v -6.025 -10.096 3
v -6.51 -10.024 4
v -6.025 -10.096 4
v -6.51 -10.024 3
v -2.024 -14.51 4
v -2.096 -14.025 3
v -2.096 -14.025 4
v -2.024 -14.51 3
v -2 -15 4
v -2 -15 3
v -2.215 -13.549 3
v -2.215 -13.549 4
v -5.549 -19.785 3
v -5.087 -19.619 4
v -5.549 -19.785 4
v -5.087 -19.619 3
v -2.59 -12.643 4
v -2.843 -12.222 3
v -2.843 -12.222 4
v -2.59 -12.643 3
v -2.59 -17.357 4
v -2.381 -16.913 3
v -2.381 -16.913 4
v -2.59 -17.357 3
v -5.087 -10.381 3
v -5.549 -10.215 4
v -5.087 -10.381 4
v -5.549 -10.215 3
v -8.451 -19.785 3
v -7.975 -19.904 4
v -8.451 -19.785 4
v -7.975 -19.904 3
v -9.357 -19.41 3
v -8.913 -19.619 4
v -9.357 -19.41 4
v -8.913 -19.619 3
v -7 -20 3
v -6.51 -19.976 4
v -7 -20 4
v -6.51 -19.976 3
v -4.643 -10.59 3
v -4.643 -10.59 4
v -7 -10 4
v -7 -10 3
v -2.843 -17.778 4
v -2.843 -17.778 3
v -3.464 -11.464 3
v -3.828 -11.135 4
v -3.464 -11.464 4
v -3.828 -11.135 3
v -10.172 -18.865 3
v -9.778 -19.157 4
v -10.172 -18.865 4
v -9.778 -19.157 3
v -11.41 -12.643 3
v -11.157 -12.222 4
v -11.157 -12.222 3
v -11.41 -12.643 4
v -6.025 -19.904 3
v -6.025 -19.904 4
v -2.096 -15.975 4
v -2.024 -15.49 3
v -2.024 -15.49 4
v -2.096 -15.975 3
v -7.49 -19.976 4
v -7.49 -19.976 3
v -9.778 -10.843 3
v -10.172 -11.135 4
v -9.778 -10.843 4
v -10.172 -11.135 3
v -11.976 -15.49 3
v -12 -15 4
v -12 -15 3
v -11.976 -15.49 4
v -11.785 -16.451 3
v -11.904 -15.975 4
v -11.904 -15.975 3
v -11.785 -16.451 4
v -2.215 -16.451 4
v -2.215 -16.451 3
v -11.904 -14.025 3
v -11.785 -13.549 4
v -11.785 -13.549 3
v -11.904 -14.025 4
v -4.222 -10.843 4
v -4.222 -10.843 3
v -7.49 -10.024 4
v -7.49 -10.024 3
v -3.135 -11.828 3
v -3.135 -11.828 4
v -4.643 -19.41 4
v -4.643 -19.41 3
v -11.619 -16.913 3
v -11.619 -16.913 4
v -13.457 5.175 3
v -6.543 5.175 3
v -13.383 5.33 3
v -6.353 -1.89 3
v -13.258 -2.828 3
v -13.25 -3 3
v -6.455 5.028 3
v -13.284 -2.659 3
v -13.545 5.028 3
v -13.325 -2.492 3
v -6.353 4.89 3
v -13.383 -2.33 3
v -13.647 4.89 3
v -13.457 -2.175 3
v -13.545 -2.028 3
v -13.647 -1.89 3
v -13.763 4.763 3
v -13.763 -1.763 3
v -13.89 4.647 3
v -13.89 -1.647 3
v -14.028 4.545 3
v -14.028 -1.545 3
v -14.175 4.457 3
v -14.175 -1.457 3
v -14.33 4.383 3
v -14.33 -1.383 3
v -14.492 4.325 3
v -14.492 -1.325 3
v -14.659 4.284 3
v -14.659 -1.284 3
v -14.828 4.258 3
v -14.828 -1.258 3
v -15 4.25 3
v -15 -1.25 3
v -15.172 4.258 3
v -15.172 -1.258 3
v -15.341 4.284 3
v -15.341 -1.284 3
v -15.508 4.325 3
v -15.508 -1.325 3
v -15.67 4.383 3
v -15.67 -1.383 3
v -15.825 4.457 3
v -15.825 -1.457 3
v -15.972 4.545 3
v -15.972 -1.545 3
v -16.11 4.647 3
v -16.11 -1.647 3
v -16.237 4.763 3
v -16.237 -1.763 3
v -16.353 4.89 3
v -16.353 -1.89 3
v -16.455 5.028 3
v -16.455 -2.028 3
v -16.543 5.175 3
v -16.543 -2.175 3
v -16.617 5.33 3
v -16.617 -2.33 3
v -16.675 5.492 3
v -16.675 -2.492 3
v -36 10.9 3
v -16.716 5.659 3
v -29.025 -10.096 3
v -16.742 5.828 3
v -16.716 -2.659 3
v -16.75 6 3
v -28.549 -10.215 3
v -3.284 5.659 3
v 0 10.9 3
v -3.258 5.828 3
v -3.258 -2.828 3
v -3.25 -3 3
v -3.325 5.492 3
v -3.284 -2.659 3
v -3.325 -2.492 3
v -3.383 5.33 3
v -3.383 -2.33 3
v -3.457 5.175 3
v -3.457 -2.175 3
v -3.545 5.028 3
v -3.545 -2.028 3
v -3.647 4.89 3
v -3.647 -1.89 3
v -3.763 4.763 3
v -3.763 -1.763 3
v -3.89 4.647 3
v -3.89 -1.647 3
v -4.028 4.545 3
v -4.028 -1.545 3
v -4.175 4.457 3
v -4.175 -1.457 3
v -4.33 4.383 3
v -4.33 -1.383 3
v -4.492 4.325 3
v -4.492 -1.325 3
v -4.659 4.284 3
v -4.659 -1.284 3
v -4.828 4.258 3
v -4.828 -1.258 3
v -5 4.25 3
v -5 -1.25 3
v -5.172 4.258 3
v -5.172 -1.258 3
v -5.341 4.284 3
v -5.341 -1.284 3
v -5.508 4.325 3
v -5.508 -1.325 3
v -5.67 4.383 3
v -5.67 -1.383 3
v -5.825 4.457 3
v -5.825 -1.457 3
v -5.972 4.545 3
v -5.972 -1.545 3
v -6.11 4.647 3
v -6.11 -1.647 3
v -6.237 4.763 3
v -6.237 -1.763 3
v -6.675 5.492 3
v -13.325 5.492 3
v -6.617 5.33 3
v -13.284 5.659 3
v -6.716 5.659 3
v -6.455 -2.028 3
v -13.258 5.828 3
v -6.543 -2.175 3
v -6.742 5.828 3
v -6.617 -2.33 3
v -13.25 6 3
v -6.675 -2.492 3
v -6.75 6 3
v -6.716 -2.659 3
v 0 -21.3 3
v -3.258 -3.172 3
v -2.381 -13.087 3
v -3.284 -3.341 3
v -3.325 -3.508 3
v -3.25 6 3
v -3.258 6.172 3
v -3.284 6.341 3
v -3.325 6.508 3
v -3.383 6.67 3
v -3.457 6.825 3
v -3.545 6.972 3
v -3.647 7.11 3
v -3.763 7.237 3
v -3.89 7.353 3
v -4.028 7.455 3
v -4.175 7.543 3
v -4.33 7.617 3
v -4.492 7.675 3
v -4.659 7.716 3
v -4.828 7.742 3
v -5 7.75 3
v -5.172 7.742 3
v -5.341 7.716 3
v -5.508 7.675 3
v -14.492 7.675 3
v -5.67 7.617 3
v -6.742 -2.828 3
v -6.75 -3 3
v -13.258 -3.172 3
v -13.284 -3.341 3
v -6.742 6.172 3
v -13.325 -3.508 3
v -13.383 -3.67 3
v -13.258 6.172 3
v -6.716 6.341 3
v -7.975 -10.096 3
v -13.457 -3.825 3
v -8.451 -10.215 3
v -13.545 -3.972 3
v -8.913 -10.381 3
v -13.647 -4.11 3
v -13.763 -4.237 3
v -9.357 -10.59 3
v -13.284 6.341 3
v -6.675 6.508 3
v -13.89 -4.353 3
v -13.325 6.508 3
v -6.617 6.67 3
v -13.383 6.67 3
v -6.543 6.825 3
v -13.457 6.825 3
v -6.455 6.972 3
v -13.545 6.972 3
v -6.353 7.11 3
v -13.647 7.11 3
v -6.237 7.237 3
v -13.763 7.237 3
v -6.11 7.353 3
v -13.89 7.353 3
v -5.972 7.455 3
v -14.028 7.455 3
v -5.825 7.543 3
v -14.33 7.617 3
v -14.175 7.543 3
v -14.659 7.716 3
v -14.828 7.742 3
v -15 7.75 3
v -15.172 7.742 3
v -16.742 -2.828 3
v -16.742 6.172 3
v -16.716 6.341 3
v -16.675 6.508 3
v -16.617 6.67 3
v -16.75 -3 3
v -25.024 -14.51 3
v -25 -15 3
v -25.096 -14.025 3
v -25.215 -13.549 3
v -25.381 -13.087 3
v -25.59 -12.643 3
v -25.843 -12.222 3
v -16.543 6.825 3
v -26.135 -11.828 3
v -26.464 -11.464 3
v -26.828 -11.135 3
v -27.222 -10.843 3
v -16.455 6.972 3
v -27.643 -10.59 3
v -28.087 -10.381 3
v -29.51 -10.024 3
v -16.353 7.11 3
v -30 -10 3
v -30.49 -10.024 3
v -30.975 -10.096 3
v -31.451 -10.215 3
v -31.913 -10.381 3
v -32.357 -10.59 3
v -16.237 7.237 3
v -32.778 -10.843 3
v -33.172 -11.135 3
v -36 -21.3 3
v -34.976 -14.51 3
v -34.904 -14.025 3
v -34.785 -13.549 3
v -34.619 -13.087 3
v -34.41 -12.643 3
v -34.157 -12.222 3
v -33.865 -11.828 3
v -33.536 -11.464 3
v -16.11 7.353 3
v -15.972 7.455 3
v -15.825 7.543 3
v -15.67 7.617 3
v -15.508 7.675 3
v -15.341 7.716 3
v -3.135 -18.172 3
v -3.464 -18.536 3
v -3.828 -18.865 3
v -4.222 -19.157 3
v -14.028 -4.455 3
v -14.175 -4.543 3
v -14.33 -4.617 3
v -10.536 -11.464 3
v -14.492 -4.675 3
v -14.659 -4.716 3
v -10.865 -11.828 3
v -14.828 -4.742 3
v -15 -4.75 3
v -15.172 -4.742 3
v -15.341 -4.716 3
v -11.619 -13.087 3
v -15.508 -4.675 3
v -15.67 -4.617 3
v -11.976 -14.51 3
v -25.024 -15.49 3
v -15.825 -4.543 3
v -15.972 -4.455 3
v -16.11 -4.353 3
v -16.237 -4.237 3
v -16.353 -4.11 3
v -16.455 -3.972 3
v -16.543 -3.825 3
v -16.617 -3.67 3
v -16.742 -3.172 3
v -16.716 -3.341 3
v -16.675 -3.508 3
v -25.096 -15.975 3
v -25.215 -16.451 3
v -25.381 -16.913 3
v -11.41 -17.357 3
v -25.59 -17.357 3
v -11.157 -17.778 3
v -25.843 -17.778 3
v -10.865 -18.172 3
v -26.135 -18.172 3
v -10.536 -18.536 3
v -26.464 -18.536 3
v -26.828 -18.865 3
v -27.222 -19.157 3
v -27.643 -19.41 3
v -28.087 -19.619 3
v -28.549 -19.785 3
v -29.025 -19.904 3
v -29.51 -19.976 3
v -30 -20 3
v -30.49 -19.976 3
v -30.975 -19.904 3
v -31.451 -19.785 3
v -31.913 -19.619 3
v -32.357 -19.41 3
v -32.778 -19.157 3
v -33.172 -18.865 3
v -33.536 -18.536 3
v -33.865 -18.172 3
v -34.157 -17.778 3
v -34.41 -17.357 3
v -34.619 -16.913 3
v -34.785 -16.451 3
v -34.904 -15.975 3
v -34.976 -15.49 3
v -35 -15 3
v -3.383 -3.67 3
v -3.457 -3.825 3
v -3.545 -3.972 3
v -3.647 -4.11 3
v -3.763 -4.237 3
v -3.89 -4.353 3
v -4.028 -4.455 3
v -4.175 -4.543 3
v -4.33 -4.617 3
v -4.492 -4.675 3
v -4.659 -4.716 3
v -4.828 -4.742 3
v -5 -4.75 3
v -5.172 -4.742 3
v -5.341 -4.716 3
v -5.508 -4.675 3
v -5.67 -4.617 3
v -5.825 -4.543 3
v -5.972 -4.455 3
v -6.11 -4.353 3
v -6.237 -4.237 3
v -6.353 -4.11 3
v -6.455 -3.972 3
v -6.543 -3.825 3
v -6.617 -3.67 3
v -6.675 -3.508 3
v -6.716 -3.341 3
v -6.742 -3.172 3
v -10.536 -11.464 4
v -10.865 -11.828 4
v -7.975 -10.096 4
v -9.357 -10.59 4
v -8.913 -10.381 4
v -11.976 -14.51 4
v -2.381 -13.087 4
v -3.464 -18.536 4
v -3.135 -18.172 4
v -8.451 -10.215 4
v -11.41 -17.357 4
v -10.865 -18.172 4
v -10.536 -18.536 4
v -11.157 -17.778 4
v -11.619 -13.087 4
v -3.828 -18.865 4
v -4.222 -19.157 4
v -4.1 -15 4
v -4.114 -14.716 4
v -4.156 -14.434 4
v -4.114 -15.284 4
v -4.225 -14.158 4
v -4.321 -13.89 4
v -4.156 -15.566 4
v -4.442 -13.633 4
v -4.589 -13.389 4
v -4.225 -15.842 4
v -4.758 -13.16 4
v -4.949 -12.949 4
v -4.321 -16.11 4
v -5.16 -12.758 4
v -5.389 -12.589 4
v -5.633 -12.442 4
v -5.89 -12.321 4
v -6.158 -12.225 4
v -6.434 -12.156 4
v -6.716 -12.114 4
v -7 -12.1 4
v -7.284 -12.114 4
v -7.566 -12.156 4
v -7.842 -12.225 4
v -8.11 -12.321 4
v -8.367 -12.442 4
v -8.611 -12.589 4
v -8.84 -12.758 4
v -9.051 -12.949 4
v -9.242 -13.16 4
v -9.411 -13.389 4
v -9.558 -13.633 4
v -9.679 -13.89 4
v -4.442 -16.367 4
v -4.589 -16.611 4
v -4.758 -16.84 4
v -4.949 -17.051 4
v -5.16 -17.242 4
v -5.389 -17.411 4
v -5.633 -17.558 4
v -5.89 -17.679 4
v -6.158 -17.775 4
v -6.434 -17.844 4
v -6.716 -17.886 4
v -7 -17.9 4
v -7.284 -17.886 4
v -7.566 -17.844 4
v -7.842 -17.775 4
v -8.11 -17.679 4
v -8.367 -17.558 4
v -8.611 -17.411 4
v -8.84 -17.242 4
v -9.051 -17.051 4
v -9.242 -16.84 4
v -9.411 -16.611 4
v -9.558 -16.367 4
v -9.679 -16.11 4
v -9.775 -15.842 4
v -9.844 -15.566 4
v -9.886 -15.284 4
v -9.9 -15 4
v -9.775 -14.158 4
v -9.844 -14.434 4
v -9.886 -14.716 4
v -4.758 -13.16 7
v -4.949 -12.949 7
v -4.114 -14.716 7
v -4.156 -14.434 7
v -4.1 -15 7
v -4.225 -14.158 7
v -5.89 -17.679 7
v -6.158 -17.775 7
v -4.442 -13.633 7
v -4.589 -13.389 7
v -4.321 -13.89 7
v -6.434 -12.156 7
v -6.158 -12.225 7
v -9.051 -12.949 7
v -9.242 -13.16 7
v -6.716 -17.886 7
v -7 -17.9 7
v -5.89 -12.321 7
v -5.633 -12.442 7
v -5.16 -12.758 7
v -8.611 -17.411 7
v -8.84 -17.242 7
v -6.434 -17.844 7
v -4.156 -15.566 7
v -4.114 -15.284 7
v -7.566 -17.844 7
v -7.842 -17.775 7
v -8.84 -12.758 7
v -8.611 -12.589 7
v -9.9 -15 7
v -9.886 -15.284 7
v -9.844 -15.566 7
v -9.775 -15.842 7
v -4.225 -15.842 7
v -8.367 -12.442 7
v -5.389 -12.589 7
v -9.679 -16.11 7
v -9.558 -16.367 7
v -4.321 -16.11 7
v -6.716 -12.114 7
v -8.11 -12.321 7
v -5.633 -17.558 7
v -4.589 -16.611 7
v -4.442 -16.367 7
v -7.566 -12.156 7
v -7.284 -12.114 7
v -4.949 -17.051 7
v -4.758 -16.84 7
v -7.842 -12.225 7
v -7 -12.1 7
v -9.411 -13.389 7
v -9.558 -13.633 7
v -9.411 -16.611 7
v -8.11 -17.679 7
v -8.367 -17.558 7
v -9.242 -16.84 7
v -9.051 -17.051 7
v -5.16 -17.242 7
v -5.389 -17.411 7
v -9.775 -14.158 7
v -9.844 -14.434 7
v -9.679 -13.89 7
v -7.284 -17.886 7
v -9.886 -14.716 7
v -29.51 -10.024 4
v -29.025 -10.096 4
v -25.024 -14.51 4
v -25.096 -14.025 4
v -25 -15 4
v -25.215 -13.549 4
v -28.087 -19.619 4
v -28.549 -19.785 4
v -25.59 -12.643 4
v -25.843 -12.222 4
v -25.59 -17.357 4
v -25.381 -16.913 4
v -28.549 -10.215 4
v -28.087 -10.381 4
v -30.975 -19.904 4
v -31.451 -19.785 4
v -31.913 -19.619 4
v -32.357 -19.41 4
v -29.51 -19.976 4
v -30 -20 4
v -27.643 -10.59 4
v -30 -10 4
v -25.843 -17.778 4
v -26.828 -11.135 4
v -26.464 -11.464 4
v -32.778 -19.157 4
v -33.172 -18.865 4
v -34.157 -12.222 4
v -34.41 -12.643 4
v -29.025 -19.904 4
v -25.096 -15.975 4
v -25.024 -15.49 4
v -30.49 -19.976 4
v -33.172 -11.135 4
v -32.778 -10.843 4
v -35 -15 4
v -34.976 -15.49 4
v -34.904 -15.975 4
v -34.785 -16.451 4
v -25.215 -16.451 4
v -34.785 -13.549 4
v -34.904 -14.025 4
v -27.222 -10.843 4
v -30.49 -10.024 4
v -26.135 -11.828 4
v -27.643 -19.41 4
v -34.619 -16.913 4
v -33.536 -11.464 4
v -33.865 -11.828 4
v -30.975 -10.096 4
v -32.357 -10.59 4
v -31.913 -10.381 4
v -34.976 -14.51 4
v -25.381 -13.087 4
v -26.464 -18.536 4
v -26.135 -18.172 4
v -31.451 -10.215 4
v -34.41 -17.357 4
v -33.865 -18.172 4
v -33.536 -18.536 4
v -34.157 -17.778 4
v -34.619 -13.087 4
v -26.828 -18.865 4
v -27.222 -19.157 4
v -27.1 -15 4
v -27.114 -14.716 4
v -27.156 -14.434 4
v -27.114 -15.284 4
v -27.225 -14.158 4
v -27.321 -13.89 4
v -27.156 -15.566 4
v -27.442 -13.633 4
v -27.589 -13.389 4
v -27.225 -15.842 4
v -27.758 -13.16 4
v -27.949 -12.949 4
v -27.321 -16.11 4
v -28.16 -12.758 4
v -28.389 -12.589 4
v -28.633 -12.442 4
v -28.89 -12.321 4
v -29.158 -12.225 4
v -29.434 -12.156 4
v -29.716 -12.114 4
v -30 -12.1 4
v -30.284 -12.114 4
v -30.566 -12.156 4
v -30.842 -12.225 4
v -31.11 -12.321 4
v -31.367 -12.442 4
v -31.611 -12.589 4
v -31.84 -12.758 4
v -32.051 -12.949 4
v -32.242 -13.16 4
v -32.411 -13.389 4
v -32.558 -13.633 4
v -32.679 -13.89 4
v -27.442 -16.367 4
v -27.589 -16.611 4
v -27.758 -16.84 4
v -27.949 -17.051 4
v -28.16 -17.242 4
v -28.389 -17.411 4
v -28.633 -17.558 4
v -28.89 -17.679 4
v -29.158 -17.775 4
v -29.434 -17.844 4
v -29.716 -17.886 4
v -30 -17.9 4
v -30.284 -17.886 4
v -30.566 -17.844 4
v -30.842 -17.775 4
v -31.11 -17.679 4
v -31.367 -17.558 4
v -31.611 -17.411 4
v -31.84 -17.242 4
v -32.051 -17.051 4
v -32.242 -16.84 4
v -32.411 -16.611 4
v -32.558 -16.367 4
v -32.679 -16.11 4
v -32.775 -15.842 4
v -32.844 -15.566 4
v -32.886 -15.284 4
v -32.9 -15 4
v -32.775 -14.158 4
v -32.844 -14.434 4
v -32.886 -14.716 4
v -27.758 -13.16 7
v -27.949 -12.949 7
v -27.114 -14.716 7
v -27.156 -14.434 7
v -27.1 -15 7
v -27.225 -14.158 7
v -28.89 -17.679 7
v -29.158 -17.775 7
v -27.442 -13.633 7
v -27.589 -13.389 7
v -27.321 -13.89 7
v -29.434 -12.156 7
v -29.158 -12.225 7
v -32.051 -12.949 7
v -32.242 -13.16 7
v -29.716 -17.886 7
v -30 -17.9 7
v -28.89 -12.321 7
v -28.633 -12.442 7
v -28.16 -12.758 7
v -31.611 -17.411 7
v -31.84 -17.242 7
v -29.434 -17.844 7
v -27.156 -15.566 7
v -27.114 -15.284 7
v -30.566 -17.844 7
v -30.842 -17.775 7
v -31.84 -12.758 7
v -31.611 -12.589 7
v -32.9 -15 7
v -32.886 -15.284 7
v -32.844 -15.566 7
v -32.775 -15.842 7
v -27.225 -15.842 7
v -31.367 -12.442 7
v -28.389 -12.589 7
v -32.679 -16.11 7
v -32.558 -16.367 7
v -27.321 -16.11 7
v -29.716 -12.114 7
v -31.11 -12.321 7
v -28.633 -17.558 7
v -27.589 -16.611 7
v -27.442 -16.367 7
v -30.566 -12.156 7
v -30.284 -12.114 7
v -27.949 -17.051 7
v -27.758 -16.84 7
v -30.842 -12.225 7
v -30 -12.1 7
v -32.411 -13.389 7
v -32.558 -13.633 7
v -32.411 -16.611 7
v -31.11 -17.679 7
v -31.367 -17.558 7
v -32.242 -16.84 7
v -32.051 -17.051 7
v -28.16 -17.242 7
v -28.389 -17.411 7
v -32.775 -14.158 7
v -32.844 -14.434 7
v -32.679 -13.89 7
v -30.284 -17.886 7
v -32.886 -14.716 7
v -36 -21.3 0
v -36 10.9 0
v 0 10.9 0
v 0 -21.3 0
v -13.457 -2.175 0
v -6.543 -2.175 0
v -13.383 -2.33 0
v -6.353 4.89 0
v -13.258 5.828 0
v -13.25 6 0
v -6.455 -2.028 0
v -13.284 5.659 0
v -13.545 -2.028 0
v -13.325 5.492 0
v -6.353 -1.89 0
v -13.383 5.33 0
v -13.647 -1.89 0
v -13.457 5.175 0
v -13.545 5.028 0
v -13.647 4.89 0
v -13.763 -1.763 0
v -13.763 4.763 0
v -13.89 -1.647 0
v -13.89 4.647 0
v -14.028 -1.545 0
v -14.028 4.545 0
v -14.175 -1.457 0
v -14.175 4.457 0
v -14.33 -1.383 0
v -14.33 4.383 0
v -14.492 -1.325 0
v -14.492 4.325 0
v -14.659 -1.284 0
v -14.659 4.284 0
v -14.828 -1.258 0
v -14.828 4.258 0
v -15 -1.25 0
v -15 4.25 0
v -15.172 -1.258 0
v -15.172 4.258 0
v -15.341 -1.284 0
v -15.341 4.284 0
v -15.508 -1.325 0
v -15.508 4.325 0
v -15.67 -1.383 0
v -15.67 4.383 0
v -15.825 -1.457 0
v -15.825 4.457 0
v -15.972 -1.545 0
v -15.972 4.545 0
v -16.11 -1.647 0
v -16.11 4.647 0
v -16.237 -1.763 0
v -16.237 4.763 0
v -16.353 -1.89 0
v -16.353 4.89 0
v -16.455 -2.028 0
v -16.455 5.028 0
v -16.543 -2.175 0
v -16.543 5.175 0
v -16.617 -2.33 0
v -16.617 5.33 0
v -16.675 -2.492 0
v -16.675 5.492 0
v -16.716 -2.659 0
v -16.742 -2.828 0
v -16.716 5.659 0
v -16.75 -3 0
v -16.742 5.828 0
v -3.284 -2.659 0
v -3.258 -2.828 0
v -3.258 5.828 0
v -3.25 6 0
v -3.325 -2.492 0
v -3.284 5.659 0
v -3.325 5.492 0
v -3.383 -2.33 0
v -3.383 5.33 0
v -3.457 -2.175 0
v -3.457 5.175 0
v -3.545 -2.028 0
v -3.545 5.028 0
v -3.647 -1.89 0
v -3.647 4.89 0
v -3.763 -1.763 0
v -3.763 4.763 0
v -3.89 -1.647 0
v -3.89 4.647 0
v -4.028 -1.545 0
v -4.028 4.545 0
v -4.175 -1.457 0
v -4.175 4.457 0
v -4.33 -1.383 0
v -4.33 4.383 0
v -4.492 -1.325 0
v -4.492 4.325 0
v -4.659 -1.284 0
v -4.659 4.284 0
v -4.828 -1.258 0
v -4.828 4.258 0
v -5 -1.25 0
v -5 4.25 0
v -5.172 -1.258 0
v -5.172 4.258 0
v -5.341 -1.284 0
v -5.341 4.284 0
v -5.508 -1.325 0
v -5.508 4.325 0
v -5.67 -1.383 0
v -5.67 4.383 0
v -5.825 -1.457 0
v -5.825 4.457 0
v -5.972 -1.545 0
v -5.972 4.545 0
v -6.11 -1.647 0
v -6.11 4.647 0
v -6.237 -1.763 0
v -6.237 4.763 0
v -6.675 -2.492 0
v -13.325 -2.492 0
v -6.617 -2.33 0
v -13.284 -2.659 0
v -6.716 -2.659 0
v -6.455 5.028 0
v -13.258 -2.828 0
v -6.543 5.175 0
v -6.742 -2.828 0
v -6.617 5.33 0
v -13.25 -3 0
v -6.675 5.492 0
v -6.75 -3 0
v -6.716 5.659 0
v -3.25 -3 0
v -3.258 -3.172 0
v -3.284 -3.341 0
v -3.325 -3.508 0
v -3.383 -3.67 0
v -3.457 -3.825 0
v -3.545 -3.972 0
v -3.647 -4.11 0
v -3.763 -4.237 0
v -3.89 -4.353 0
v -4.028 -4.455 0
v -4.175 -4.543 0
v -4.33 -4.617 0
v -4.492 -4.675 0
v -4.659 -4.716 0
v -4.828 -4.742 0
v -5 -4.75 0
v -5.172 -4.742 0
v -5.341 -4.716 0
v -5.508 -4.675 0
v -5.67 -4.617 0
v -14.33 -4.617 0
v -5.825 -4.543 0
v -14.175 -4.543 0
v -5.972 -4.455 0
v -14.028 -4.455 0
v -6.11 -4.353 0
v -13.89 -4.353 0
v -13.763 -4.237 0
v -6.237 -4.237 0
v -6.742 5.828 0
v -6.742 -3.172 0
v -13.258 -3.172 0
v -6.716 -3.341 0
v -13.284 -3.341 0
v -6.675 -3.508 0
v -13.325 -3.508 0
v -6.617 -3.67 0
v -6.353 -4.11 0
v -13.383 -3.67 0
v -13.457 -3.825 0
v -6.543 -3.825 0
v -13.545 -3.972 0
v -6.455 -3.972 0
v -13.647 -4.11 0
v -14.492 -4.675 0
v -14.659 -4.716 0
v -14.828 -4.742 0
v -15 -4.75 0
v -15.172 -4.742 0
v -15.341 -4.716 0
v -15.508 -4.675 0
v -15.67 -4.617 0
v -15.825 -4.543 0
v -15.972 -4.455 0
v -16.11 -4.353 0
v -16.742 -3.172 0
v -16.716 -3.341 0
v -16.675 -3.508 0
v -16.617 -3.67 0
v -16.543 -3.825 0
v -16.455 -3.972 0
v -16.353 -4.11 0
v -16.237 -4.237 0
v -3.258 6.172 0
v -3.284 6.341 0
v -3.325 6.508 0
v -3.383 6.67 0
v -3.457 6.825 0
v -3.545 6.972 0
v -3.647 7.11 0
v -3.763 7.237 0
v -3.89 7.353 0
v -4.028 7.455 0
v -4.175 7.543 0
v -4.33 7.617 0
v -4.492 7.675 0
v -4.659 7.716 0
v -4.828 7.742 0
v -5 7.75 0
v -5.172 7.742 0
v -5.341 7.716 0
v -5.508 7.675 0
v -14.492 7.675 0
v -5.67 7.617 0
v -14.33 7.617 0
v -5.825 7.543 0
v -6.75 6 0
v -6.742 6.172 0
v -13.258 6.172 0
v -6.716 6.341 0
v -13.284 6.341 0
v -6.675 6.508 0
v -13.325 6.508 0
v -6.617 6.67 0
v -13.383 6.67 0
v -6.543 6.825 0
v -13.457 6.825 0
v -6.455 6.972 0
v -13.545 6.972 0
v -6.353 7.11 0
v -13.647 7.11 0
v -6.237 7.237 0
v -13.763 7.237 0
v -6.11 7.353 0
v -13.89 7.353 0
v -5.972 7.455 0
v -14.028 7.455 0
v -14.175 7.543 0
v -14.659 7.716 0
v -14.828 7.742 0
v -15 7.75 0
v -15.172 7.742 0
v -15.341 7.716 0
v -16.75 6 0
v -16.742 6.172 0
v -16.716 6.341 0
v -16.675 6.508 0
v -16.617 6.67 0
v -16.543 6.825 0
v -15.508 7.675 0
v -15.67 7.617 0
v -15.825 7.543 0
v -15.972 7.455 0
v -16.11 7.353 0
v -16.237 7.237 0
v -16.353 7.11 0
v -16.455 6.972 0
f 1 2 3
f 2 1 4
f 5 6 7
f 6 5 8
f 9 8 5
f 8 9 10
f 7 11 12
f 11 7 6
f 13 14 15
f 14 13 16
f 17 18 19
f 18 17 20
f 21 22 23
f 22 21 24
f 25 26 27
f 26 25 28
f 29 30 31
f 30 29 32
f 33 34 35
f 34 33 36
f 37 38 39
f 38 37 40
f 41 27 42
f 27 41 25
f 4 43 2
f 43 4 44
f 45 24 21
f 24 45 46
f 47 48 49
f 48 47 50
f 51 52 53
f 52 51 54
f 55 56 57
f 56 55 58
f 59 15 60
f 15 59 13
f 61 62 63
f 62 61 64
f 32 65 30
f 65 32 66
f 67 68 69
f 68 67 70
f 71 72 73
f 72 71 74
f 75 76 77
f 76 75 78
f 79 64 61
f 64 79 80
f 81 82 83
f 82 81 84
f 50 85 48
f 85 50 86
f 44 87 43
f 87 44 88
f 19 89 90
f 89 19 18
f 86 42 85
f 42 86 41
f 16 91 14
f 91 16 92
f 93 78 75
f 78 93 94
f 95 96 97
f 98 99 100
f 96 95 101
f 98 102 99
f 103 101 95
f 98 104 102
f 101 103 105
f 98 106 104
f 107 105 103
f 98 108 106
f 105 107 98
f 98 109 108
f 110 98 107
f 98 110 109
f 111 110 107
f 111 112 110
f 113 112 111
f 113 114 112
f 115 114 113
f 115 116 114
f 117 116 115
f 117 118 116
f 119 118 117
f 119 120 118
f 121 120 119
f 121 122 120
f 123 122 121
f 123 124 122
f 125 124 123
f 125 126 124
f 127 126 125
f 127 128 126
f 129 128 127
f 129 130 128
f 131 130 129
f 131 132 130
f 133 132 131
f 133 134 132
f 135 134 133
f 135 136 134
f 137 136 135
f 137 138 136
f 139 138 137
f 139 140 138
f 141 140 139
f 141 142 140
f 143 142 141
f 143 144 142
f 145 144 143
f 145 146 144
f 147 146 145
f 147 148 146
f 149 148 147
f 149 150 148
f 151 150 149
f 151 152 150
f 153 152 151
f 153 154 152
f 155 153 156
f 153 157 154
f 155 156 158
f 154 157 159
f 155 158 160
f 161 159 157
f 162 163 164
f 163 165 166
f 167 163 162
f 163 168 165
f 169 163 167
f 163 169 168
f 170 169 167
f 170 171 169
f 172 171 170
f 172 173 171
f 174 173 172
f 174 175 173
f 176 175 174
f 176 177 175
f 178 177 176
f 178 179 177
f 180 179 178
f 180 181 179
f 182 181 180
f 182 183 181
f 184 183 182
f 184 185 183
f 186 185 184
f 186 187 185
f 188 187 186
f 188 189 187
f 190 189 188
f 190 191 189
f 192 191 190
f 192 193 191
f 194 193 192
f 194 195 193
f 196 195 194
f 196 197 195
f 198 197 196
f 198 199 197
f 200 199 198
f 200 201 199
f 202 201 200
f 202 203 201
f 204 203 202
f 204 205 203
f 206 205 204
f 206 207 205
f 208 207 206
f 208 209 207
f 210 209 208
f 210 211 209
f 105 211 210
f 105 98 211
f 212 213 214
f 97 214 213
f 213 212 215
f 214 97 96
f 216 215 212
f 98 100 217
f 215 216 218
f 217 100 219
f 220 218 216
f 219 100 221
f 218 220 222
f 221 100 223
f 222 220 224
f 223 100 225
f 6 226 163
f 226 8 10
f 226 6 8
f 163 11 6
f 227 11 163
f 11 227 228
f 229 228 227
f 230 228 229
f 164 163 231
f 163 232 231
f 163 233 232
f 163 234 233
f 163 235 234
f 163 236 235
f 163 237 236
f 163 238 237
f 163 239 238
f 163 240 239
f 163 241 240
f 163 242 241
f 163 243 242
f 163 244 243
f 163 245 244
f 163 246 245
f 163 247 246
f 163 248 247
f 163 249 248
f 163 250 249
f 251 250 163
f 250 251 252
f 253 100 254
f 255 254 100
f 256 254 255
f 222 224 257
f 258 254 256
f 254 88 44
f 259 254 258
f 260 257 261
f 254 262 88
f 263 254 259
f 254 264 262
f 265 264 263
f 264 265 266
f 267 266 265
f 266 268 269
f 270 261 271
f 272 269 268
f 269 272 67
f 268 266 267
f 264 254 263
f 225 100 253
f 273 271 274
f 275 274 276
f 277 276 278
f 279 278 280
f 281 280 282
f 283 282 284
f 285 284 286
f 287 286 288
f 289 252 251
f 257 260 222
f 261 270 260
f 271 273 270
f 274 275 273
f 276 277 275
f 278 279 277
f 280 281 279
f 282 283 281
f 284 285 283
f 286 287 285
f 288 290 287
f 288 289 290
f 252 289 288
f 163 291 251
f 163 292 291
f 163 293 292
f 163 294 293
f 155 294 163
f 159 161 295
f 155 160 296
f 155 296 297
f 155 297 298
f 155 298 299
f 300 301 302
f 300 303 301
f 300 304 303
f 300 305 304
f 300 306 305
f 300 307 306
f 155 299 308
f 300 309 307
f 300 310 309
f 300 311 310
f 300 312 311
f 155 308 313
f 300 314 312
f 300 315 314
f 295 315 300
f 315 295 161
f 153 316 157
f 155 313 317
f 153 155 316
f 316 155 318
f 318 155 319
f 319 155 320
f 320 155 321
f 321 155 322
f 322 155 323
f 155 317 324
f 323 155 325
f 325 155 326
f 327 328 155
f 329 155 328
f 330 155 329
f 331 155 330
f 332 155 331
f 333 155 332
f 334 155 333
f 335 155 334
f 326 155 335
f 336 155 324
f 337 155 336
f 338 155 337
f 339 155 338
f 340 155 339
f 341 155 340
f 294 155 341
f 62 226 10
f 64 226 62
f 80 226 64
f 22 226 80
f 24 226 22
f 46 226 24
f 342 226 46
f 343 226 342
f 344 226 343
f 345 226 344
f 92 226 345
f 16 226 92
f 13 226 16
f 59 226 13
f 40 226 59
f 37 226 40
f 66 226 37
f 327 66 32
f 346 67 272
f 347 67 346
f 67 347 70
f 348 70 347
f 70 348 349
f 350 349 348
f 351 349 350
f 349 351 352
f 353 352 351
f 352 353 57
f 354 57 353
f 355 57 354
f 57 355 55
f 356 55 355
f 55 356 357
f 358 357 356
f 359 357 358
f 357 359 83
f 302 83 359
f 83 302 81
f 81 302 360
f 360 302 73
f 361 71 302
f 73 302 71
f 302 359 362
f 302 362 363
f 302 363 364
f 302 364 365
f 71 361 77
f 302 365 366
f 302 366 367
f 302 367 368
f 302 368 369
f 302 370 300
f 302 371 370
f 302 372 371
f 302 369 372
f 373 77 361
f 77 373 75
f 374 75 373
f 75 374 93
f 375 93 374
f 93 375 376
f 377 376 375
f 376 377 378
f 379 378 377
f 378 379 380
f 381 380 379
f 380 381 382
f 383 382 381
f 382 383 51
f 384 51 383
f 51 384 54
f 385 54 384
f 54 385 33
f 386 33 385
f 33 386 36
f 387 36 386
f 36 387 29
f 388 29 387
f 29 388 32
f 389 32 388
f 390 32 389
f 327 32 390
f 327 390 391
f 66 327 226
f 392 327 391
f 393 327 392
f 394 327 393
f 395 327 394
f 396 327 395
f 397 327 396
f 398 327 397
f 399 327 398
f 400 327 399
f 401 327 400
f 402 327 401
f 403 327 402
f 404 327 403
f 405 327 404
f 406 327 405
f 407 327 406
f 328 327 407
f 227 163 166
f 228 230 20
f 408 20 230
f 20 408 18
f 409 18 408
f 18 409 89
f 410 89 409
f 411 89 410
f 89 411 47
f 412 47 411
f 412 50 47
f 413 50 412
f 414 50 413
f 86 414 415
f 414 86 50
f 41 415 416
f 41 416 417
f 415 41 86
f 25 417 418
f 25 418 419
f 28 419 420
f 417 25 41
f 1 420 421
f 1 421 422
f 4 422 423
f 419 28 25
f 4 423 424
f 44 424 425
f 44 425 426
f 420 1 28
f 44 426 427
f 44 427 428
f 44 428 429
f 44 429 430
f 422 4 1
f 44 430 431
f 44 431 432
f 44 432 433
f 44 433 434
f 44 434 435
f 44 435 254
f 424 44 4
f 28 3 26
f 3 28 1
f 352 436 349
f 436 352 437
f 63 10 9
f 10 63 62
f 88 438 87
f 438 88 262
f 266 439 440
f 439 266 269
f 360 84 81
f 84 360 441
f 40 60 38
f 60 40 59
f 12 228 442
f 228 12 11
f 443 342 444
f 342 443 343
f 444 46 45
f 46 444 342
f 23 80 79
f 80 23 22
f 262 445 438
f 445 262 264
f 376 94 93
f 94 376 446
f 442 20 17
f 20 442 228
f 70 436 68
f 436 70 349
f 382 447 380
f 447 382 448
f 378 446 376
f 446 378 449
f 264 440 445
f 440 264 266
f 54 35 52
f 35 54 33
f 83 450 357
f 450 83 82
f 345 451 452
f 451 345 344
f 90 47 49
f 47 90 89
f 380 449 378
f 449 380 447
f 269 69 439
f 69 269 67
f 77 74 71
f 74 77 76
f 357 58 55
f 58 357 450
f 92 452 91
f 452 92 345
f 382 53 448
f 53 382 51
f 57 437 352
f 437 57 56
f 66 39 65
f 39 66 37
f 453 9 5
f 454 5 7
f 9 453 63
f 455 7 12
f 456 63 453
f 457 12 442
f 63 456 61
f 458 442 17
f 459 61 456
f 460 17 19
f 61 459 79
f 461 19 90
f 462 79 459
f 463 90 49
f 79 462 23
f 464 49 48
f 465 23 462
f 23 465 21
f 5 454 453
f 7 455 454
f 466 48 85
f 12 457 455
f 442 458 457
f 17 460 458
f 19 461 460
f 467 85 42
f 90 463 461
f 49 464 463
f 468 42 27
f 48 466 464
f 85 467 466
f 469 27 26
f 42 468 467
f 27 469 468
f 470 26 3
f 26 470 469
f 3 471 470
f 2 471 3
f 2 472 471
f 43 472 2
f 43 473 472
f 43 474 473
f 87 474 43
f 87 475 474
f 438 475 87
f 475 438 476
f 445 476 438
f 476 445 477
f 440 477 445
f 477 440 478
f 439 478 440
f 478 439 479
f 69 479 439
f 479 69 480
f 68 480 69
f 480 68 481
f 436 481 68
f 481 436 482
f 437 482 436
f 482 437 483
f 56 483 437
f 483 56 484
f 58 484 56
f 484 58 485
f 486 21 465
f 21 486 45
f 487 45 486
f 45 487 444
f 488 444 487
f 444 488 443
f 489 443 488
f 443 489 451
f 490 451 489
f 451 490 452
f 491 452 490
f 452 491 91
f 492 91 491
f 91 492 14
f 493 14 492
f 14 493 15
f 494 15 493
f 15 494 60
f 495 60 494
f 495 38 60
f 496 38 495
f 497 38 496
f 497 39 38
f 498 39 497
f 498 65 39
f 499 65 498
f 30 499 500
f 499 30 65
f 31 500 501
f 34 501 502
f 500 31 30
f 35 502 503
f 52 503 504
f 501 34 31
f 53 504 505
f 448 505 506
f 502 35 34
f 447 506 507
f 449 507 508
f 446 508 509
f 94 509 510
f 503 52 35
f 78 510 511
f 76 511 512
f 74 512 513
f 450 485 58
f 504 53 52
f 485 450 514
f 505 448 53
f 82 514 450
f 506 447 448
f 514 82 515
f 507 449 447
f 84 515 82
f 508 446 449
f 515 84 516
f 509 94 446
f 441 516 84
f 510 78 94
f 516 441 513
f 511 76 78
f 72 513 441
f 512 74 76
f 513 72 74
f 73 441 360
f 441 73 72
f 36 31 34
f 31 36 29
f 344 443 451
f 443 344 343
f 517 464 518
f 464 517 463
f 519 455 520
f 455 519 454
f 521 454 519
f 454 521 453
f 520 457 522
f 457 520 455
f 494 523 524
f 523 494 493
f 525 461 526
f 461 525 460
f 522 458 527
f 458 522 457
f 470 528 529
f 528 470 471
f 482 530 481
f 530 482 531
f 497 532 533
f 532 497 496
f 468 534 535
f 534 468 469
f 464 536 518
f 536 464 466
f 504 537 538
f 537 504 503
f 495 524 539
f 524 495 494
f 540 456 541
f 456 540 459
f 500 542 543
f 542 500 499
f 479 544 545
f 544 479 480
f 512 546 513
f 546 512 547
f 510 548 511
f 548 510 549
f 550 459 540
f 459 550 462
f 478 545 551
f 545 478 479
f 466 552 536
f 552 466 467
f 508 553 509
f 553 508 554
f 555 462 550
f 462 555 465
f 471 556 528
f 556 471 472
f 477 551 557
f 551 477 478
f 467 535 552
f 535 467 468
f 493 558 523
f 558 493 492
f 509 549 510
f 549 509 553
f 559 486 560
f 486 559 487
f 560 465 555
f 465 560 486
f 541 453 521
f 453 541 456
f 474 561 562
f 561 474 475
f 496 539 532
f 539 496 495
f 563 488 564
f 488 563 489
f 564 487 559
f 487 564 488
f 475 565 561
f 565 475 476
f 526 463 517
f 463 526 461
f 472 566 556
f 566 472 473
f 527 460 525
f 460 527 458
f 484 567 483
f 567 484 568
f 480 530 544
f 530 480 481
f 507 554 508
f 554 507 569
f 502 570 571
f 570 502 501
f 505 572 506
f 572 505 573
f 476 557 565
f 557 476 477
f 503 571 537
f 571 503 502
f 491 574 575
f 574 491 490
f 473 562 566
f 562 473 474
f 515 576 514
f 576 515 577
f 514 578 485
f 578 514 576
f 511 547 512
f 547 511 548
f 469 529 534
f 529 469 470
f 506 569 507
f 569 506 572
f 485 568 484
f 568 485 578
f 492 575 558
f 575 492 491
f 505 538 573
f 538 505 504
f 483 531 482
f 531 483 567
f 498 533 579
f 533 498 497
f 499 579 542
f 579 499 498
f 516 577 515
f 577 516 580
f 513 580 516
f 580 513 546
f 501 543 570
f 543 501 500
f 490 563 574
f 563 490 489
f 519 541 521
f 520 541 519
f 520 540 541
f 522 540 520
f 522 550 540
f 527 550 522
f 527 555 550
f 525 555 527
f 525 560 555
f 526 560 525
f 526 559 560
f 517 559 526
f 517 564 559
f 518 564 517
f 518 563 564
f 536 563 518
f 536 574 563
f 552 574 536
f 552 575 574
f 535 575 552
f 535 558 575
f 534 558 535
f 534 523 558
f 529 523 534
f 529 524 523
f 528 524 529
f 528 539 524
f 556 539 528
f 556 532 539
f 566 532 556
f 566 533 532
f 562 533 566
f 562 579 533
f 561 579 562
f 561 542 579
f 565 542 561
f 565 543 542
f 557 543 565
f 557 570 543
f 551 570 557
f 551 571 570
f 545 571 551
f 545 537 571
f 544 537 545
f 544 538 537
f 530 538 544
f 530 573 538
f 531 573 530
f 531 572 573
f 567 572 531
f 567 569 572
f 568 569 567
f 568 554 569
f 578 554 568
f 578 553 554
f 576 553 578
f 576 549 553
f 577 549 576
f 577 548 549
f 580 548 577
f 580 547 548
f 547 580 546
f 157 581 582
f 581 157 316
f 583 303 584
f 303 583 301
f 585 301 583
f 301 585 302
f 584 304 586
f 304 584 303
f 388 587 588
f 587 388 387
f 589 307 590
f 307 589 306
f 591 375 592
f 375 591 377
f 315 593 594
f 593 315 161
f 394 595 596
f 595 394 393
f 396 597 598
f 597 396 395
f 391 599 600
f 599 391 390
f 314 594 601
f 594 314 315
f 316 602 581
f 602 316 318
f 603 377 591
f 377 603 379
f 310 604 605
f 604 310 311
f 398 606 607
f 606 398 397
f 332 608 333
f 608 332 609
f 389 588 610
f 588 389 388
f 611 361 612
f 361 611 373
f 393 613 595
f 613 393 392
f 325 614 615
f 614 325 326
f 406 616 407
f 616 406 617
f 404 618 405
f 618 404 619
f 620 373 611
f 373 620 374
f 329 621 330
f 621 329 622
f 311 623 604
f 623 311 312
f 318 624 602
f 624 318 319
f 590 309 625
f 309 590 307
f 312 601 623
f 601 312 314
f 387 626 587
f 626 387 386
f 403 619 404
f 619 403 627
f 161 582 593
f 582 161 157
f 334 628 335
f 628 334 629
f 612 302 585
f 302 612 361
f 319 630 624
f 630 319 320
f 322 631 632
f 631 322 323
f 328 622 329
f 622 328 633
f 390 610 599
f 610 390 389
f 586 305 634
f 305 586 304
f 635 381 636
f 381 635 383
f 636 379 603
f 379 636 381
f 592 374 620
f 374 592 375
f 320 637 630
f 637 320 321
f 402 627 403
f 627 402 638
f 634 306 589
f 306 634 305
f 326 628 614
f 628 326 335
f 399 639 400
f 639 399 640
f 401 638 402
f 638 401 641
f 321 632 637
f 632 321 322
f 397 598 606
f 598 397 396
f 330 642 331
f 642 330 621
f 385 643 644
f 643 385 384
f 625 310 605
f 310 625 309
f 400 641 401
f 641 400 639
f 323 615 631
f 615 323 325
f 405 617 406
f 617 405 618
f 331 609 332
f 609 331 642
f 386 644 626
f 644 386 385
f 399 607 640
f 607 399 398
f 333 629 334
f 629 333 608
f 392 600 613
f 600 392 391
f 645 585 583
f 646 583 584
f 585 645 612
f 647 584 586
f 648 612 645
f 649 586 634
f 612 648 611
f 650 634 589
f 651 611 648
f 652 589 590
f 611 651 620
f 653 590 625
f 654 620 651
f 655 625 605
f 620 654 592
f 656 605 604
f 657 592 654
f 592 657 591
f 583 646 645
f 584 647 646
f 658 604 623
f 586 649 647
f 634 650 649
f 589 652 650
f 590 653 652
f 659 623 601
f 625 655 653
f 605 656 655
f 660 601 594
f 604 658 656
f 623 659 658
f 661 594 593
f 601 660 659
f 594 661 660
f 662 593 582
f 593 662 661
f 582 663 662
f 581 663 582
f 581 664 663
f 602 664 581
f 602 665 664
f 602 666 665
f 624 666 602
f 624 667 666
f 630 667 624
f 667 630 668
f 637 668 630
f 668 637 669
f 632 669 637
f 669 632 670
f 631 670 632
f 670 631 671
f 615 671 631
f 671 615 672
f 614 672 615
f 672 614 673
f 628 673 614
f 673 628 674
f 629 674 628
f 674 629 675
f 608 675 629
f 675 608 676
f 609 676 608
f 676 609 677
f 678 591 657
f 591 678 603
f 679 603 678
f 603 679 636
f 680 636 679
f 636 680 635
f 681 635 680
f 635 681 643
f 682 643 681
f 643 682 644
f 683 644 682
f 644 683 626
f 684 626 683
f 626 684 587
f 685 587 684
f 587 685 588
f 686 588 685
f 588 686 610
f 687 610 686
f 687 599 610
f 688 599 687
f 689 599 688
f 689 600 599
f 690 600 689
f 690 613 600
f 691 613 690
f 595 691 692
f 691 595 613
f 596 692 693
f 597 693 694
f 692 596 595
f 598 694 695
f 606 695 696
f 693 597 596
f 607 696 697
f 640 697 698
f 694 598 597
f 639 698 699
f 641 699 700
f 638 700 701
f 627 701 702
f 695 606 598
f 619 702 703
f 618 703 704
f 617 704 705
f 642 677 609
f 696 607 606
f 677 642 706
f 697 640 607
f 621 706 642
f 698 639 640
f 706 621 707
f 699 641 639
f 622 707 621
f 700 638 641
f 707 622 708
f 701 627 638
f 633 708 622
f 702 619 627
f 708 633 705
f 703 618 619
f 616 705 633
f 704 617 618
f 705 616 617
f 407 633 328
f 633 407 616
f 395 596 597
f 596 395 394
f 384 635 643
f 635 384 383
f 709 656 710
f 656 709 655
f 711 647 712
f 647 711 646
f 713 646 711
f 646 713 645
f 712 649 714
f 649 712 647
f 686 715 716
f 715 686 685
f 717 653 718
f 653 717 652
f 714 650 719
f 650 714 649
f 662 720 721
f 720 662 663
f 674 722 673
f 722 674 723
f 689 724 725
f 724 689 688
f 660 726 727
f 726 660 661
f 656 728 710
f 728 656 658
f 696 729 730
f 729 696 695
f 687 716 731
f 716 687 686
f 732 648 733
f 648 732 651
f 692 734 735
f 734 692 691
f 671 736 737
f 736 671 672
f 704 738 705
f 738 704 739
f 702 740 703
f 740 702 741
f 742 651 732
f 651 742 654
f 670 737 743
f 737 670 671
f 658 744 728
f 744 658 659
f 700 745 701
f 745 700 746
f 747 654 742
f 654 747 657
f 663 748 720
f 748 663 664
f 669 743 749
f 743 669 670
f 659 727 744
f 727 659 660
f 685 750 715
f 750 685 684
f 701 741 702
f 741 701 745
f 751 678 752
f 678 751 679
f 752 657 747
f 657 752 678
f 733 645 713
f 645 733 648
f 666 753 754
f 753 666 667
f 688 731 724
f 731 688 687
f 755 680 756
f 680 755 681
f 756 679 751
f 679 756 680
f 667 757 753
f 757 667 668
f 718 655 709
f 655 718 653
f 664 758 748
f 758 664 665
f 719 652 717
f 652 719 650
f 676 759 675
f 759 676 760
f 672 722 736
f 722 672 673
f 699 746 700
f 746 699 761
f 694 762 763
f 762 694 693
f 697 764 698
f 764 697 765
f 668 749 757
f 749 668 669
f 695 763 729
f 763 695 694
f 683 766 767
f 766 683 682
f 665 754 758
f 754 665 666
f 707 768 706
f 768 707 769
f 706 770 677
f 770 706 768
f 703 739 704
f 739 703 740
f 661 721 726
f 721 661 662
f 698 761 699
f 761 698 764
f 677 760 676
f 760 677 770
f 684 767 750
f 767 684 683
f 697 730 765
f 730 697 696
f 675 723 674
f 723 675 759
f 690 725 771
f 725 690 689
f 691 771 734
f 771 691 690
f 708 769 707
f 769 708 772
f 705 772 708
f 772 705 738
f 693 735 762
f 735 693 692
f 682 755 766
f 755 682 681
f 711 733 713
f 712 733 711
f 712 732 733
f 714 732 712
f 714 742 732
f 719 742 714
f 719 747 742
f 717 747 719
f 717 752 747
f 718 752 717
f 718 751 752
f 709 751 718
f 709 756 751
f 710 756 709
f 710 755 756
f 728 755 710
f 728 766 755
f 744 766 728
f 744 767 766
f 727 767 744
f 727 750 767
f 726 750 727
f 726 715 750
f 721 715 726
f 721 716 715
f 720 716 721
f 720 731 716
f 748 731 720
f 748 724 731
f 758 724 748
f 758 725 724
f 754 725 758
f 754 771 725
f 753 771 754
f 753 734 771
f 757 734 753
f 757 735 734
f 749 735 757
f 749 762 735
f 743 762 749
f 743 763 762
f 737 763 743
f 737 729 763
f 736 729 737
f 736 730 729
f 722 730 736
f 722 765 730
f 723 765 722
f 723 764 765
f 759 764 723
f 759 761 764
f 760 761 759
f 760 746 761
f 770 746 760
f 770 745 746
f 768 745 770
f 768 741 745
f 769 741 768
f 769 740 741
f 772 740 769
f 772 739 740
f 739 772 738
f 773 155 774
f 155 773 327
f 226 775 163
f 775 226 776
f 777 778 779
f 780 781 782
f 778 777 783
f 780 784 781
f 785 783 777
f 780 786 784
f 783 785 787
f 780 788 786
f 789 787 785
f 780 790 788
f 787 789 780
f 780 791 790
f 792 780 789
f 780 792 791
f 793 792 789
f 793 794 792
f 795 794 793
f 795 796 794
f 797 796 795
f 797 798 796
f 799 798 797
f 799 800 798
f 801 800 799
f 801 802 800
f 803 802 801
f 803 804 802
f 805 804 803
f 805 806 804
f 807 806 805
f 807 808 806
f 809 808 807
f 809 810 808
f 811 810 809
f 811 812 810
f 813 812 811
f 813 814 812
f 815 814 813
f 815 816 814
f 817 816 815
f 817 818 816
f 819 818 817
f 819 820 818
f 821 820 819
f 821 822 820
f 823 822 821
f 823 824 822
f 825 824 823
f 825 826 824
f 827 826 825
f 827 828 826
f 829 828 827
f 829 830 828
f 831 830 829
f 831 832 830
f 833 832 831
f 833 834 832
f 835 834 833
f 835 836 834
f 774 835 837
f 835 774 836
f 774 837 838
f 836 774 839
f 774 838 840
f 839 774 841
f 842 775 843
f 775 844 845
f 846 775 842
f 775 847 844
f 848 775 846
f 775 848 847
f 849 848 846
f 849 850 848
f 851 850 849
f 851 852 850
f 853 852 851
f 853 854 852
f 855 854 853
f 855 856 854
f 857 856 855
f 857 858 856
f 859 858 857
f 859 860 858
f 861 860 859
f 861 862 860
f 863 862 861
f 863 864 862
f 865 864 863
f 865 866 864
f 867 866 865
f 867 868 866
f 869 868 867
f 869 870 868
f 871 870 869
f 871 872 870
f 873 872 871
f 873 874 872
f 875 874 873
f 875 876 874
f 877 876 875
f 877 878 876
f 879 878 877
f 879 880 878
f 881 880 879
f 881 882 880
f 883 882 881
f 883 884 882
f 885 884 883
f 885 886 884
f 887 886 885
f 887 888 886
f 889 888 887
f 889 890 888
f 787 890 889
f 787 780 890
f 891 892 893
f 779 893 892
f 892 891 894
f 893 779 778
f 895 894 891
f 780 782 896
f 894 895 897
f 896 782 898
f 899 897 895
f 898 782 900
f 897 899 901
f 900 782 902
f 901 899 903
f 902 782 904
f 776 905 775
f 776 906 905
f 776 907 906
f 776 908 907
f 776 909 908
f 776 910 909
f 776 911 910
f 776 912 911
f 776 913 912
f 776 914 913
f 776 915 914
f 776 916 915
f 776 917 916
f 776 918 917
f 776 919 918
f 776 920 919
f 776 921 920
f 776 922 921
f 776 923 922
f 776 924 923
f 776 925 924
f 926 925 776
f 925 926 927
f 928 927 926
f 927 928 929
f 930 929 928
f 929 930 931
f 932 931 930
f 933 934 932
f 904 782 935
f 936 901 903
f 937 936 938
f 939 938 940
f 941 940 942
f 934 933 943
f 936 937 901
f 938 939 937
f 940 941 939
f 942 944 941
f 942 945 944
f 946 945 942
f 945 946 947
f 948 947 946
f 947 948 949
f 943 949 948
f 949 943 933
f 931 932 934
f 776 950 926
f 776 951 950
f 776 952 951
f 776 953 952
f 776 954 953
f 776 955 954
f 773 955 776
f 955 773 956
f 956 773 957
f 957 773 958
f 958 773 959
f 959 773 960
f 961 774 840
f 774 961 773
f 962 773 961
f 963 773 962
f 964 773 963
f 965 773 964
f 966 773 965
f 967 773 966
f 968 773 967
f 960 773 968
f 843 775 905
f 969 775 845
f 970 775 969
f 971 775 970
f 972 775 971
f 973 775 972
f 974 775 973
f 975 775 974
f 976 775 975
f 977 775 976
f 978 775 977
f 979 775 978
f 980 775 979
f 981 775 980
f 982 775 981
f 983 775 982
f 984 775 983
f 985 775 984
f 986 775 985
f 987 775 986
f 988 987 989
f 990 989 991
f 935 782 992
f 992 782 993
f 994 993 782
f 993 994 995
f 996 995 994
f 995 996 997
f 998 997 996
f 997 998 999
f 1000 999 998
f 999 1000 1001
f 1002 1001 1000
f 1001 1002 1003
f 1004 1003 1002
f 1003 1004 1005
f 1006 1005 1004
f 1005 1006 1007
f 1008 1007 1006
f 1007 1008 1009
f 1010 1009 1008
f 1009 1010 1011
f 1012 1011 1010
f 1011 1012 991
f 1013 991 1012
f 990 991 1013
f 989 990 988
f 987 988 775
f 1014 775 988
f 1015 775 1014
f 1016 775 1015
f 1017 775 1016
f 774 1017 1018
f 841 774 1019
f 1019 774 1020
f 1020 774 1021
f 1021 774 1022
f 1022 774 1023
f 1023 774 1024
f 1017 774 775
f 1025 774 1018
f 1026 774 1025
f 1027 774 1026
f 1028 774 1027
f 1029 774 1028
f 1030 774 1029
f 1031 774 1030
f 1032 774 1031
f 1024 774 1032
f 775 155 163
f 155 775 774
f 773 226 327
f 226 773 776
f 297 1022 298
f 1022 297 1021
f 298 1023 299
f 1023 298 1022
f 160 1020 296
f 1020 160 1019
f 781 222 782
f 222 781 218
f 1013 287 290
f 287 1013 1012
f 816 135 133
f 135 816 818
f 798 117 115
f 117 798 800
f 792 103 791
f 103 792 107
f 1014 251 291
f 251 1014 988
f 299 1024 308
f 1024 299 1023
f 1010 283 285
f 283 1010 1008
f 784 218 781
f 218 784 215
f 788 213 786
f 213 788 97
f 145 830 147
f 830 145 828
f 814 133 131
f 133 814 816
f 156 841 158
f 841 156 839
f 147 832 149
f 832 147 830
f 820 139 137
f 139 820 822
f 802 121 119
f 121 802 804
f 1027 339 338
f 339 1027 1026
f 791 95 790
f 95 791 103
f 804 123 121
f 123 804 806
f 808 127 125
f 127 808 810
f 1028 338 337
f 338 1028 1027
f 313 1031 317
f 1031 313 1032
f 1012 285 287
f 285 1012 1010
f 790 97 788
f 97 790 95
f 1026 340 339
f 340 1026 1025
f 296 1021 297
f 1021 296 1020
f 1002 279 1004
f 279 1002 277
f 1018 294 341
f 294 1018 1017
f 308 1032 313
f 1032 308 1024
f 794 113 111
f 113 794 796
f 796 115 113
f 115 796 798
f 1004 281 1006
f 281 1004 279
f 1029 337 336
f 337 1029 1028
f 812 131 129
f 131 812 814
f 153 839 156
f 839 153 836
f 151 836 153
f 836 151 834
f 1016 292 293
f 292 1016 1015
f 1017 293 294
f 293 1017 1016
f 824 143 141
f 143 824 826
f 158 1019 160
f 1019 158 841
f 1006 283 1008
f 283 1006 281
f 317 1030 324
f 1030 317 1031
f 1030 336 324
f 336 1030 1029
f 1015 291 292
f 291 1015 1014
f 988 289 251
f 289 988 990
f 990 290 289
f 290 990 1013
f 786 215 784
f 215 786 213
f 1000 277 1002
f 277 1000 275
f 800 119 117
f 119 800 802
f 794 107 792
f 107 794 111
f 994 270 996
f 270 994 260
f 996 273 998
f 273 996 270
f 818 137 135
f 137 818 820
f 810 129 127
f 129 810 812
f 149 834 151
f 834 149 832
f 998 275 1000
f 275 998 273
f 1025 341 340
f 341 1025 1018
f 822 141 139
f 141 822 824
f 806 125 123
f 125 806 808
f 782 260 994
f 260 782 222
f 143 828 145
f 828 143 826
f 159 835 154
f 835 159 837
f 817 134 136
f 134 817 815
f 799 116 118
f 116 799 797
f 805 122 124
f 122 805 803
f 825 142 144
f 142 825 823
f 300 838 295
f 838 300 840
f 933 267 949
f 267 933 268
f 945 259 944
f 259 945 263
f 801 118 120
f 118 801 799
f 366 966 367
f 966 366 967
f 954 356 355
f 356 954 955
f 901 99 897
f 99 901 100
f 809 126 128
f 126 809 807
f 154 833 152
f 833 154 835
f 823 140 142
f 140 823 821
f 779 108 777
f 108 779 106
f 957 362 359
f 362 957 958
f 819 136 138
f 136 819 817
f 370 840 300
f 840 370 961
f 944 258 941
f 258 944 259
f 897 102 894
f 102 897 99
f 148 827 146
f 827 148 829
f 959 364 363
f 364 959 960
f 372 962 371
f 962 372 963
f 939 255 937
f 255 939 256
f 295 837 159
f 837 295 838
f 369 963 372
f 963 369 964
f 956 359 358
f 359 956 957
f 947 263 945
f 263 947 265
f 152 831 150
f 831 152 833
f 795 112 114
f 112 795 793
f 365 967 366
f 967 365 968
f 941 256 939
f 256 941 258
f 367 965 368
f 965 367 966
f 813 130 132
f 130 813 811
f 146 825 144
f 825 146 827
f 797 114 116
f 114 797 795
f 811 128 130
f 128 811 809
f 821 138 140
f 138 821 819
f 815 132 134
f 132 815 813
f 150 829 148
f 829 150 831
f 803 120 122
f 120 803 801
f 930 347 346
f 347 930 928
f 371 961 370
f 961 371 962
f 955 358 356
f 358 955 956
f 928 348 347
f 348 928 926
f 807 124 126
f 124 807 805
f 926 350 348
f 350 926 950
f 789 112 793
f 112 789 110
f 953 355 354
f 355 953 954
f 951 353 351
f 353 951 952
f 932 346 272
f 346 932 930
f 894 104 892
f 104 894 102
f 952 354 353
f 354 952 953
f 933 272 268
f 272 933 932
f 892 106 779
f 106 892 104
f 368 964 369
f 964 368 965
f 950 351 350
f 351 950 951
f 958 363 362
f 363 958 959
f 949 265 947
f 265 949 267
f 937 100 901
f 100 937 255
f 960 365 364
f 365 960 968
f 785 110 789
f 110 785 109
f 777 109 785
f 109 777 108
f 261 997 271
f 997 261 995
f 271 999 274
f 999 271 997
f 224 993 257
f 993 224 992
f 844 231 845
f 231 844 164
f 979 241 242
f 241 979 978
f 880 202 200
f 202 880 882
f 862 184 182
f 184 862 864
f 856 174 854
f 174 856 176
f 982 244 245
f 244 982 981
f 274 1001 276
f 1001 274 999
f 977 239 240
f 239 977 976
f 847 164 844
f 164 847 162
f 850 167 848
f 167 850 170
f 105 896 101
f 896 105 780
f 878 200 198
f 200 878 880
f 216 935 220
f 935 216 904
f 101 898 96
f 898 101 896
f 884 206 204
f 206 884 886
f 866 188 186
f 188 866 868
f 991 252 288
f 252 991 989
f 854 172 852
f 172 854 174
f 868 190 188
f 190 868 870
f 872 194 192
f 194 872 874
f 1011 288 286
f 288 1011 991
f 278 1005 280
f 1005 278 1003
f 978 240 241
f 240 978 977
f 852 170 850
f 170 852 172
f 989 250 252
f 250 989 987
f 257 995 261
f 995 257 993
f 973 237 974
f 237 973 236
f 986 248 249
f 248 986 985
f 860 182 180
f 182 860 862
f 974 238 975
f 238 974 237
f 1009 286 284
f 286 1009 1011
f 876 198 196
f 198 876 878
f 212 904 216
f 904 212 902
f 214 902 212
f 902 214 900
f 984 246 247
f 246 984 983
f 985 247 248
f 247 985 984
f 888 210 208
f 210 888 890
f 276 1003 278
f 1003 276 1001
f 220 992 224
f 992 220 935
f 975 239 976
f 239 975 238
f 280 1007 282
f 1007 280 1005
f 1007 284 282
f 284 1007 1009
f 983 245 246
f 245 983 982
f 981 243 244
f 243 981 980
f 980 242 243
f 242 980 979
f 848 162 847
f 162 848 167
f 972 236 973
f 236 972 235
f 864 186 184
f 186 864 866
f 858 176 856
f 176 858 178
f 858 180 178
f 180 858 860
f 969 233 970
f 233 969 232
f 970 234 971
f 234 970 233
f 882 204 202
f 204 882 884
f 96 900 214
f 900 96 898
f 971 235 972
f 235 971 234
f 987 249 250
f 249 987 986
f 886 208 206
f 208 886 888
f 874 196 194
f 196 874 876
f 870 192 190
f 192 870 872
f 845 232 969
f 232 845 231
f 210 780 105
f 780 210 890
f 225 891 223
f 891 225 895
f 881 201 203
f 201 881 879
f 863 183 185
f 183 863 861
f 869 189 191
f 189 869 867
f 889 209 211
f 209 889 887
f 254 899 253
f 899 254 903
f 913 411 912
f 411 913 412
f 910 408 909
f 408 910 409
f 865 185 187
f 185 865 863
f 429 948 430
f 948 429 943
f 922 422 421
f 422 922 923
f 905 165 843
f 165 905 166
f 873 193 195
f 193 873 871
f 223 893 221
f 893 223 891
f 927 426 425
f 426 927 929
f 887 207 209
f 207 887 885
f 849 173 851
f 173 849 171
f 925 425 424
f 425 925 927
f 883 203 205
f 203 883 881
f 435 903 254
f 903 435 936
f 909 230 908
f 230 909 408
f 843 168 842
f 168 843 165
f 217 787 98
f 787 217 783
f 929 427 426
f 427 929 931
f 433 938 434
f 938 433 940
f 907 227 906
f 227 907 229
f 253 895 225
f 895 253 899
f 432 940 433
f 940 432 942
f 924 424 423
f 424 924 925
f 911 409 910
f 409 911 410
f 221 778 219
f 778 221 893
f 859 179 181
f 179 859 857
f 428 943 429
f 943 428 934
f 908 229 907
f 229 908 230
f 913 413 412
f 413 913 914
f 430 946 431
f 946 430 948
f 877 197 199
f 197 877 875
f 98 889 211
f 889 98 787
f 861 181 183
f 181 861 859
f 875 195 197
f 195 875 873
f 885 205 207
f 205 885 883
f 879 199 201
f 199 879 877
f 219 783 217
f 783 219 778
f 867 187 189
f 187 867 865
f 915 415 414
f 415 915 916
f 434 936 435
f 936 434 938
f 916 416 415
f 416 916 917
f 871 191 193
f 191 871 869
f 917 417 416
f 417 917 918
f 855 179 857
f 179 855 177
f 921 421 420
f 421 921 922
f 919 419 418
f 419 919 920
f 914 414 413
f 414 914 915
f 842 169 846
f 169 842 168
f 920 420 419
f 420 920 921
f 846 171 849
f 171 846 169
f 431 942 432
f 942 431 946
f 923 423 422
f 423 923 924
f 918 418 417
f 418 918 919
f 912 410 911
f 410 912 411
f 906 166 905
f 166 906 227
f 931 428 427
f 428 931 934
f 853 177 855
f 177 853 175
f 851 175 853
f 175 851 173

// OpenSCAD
// file: subpieces/articulation-axis.scad
articulationAxisSubPiece();

/**
 * articulationAxisSubPiece
 * @name articulationAxisSubPiece
 * @description articlulation axis
 * @type subPiece
 */

module articulationAxisSubPiece(
    base_diameter,
    base_height,
    axis_diameter,
    axis_height,
    _fn = 64
) {
    cylinder(
        r = base_diameter / 2,
        h = base_height,
        $fn = _fn
    );
    translate(
        [
            0,
            0,
            base_height
        ]
    )
        cylinder(
            r = axis_diameter / 2,
            h = axis_height,
            $fn = _fn
        );

}
// file: ../envelopes/screw-envelope.scad
screwEnvelope();

module screwEnvelope(
    center_screwed_position = false,
    diameter_ajustment_head = 0.2,
    diameter_ajustment_screw = -0.1,
    _fn = 128
) {

    head_height = 2.1;
    middle_height = 0.9;
    bottom_height = 6;

    z_centring_translation = center_screwed_position ? -head_height -middle_height : 0;

    translate([0,0, z_centring_translation])
        union() {
            cylinder(
                r = 7.95 / 2 + diameter_ajustment_head,
                h = head_height + middle_height,
                $fn = _fn);
            translate([0, 0, head_height + middle_height])
                cylinder(
                    r1 = 3.4 / 2 + diameter_ajustment_screw,
                    r2 = 3.1 / 2 + diameter_ajustment_screw,
                    h = bottom_height,
                    $fn = _fn
                );
        }
}
// file: ../envelopes/servo-envelope.scad
servoEnvelope();

// Enveloppe for servo holes fixations
// Around the servo motor and the fixation holes

module servoEnvelope(
    servo_hole_scale = 1,
    screw_hole_diameter = 2
) {

    servo_length = 22.2;
    servo_width = 11.8;
    servo_height = 22.7;

    // translating to center the servo motor envelope as servo
    scale(servo_hole_scale)
        translate([-servo_width / 2, - servo_length + (servo_width / 2), -servo_height/2])
            cube([servo_width, servo_length, servo_height], center = false);    

    
    translate([-servo_width / 2, - servo_length + (servo_width / 2), -servo_height/2]) {
        translate([servo_width / 2, - 2.3, 0])
            cylinder(h = servo_height, r = 1, center = false, $fn = 16);

        translate([servo_width / 2, servo_length + 2.3, 0])
            cylinder(h = servo_height, r = 1, center = false, $fn = 16);
    }
}
// main file
use <../envelopes/servo-envelope.scad>
use <../envelopes/screw-envelope.scad>
use <./subpieces/articulation-axis.scad>


/**
 * HipPieceB
 * @name HipPieceB
 * @description Hip Piece B
 * @type piece
 * @parent HipComponent
 */
module hipPieceB(
    x_offset_top_axis = -15,
    x_offset_bottom_axis = -15
) {

    main_piece_height = 36;
    articluation_axis_diameter_offest = 0.2;

    display_optional_screw_holes = false;
    
    screw_hole_diameter = 3.5;

    _fn = 64;

    difference() {
        union() {
            translate(
                [
                    0,
                    -32.2 + 5 + (11.8 / 2),
                    0
                ])
                cube([3, 32.2, main_piece_height]);

            translate(
                [
                    3,
                    x_offset_bottom_axis,
                    7
                ])
                rotate([0, 90, 0])
                    articulationAxisSubPiece(
                        base_diameter = 10,
                        base_height = 1,
                        axis_diameter = 6 - articluation_axis_diameter_offest,
                        axis_height = 3
                    );

            translate(
                [
                    3,
                    x_offset_bottom_axis,
                    30
                ])
                rotate([0, 90, 0])
                    articulationAxisSubPiece(
                        base_diameter = 10,
                        base_height = 1,
                        axis_diameter = 6 - articluation_axis_diameter_offest,
                        axis_height = 3
                    );

        }

        // Hole for the screw of the bottom articulation axis
        if (display_optional_screw_holes)
            translate([4.01 + 3, x_offset_bottom_axis, 7])
                rotate([0, -90, 0])
                    screwEnvelope(center_screwed_position = true);
        
        // 4 Holes for the hip block fixations
        translate([1.5, 0, 0]) {
            translate([0, 6, 15])
                rotate([0, -90, 0])
                    cylinder(r = screw_hole_diameter / 2, h = 10, center = true, $fn = _fn);

            translate([0, -3, 15])
                rotate([0, -90, 0])
                    cylinder(r = screw_hole_diameter / 2, h = 10, center = true, $fn = _fn);

            translate([0, 6, 5])
                rotate([0, -90, 0])
                    cylinder(r = screw_hole_diameter / 2, h = 10, center = true, $fn = _fn);

            translate([0, -3, 5])
                rotate([0, -90, 0])
                    cylinder(r = screw_hole_diameter / 2, h = 10, center = true, $fn = _fn);
        }
    }
}


/**
 * @stl
 * @png
 * @colorscheme BeforeDawn
 * @view axes,scales
 */
rotate([0, -90, 0])
    hipPieceB();
